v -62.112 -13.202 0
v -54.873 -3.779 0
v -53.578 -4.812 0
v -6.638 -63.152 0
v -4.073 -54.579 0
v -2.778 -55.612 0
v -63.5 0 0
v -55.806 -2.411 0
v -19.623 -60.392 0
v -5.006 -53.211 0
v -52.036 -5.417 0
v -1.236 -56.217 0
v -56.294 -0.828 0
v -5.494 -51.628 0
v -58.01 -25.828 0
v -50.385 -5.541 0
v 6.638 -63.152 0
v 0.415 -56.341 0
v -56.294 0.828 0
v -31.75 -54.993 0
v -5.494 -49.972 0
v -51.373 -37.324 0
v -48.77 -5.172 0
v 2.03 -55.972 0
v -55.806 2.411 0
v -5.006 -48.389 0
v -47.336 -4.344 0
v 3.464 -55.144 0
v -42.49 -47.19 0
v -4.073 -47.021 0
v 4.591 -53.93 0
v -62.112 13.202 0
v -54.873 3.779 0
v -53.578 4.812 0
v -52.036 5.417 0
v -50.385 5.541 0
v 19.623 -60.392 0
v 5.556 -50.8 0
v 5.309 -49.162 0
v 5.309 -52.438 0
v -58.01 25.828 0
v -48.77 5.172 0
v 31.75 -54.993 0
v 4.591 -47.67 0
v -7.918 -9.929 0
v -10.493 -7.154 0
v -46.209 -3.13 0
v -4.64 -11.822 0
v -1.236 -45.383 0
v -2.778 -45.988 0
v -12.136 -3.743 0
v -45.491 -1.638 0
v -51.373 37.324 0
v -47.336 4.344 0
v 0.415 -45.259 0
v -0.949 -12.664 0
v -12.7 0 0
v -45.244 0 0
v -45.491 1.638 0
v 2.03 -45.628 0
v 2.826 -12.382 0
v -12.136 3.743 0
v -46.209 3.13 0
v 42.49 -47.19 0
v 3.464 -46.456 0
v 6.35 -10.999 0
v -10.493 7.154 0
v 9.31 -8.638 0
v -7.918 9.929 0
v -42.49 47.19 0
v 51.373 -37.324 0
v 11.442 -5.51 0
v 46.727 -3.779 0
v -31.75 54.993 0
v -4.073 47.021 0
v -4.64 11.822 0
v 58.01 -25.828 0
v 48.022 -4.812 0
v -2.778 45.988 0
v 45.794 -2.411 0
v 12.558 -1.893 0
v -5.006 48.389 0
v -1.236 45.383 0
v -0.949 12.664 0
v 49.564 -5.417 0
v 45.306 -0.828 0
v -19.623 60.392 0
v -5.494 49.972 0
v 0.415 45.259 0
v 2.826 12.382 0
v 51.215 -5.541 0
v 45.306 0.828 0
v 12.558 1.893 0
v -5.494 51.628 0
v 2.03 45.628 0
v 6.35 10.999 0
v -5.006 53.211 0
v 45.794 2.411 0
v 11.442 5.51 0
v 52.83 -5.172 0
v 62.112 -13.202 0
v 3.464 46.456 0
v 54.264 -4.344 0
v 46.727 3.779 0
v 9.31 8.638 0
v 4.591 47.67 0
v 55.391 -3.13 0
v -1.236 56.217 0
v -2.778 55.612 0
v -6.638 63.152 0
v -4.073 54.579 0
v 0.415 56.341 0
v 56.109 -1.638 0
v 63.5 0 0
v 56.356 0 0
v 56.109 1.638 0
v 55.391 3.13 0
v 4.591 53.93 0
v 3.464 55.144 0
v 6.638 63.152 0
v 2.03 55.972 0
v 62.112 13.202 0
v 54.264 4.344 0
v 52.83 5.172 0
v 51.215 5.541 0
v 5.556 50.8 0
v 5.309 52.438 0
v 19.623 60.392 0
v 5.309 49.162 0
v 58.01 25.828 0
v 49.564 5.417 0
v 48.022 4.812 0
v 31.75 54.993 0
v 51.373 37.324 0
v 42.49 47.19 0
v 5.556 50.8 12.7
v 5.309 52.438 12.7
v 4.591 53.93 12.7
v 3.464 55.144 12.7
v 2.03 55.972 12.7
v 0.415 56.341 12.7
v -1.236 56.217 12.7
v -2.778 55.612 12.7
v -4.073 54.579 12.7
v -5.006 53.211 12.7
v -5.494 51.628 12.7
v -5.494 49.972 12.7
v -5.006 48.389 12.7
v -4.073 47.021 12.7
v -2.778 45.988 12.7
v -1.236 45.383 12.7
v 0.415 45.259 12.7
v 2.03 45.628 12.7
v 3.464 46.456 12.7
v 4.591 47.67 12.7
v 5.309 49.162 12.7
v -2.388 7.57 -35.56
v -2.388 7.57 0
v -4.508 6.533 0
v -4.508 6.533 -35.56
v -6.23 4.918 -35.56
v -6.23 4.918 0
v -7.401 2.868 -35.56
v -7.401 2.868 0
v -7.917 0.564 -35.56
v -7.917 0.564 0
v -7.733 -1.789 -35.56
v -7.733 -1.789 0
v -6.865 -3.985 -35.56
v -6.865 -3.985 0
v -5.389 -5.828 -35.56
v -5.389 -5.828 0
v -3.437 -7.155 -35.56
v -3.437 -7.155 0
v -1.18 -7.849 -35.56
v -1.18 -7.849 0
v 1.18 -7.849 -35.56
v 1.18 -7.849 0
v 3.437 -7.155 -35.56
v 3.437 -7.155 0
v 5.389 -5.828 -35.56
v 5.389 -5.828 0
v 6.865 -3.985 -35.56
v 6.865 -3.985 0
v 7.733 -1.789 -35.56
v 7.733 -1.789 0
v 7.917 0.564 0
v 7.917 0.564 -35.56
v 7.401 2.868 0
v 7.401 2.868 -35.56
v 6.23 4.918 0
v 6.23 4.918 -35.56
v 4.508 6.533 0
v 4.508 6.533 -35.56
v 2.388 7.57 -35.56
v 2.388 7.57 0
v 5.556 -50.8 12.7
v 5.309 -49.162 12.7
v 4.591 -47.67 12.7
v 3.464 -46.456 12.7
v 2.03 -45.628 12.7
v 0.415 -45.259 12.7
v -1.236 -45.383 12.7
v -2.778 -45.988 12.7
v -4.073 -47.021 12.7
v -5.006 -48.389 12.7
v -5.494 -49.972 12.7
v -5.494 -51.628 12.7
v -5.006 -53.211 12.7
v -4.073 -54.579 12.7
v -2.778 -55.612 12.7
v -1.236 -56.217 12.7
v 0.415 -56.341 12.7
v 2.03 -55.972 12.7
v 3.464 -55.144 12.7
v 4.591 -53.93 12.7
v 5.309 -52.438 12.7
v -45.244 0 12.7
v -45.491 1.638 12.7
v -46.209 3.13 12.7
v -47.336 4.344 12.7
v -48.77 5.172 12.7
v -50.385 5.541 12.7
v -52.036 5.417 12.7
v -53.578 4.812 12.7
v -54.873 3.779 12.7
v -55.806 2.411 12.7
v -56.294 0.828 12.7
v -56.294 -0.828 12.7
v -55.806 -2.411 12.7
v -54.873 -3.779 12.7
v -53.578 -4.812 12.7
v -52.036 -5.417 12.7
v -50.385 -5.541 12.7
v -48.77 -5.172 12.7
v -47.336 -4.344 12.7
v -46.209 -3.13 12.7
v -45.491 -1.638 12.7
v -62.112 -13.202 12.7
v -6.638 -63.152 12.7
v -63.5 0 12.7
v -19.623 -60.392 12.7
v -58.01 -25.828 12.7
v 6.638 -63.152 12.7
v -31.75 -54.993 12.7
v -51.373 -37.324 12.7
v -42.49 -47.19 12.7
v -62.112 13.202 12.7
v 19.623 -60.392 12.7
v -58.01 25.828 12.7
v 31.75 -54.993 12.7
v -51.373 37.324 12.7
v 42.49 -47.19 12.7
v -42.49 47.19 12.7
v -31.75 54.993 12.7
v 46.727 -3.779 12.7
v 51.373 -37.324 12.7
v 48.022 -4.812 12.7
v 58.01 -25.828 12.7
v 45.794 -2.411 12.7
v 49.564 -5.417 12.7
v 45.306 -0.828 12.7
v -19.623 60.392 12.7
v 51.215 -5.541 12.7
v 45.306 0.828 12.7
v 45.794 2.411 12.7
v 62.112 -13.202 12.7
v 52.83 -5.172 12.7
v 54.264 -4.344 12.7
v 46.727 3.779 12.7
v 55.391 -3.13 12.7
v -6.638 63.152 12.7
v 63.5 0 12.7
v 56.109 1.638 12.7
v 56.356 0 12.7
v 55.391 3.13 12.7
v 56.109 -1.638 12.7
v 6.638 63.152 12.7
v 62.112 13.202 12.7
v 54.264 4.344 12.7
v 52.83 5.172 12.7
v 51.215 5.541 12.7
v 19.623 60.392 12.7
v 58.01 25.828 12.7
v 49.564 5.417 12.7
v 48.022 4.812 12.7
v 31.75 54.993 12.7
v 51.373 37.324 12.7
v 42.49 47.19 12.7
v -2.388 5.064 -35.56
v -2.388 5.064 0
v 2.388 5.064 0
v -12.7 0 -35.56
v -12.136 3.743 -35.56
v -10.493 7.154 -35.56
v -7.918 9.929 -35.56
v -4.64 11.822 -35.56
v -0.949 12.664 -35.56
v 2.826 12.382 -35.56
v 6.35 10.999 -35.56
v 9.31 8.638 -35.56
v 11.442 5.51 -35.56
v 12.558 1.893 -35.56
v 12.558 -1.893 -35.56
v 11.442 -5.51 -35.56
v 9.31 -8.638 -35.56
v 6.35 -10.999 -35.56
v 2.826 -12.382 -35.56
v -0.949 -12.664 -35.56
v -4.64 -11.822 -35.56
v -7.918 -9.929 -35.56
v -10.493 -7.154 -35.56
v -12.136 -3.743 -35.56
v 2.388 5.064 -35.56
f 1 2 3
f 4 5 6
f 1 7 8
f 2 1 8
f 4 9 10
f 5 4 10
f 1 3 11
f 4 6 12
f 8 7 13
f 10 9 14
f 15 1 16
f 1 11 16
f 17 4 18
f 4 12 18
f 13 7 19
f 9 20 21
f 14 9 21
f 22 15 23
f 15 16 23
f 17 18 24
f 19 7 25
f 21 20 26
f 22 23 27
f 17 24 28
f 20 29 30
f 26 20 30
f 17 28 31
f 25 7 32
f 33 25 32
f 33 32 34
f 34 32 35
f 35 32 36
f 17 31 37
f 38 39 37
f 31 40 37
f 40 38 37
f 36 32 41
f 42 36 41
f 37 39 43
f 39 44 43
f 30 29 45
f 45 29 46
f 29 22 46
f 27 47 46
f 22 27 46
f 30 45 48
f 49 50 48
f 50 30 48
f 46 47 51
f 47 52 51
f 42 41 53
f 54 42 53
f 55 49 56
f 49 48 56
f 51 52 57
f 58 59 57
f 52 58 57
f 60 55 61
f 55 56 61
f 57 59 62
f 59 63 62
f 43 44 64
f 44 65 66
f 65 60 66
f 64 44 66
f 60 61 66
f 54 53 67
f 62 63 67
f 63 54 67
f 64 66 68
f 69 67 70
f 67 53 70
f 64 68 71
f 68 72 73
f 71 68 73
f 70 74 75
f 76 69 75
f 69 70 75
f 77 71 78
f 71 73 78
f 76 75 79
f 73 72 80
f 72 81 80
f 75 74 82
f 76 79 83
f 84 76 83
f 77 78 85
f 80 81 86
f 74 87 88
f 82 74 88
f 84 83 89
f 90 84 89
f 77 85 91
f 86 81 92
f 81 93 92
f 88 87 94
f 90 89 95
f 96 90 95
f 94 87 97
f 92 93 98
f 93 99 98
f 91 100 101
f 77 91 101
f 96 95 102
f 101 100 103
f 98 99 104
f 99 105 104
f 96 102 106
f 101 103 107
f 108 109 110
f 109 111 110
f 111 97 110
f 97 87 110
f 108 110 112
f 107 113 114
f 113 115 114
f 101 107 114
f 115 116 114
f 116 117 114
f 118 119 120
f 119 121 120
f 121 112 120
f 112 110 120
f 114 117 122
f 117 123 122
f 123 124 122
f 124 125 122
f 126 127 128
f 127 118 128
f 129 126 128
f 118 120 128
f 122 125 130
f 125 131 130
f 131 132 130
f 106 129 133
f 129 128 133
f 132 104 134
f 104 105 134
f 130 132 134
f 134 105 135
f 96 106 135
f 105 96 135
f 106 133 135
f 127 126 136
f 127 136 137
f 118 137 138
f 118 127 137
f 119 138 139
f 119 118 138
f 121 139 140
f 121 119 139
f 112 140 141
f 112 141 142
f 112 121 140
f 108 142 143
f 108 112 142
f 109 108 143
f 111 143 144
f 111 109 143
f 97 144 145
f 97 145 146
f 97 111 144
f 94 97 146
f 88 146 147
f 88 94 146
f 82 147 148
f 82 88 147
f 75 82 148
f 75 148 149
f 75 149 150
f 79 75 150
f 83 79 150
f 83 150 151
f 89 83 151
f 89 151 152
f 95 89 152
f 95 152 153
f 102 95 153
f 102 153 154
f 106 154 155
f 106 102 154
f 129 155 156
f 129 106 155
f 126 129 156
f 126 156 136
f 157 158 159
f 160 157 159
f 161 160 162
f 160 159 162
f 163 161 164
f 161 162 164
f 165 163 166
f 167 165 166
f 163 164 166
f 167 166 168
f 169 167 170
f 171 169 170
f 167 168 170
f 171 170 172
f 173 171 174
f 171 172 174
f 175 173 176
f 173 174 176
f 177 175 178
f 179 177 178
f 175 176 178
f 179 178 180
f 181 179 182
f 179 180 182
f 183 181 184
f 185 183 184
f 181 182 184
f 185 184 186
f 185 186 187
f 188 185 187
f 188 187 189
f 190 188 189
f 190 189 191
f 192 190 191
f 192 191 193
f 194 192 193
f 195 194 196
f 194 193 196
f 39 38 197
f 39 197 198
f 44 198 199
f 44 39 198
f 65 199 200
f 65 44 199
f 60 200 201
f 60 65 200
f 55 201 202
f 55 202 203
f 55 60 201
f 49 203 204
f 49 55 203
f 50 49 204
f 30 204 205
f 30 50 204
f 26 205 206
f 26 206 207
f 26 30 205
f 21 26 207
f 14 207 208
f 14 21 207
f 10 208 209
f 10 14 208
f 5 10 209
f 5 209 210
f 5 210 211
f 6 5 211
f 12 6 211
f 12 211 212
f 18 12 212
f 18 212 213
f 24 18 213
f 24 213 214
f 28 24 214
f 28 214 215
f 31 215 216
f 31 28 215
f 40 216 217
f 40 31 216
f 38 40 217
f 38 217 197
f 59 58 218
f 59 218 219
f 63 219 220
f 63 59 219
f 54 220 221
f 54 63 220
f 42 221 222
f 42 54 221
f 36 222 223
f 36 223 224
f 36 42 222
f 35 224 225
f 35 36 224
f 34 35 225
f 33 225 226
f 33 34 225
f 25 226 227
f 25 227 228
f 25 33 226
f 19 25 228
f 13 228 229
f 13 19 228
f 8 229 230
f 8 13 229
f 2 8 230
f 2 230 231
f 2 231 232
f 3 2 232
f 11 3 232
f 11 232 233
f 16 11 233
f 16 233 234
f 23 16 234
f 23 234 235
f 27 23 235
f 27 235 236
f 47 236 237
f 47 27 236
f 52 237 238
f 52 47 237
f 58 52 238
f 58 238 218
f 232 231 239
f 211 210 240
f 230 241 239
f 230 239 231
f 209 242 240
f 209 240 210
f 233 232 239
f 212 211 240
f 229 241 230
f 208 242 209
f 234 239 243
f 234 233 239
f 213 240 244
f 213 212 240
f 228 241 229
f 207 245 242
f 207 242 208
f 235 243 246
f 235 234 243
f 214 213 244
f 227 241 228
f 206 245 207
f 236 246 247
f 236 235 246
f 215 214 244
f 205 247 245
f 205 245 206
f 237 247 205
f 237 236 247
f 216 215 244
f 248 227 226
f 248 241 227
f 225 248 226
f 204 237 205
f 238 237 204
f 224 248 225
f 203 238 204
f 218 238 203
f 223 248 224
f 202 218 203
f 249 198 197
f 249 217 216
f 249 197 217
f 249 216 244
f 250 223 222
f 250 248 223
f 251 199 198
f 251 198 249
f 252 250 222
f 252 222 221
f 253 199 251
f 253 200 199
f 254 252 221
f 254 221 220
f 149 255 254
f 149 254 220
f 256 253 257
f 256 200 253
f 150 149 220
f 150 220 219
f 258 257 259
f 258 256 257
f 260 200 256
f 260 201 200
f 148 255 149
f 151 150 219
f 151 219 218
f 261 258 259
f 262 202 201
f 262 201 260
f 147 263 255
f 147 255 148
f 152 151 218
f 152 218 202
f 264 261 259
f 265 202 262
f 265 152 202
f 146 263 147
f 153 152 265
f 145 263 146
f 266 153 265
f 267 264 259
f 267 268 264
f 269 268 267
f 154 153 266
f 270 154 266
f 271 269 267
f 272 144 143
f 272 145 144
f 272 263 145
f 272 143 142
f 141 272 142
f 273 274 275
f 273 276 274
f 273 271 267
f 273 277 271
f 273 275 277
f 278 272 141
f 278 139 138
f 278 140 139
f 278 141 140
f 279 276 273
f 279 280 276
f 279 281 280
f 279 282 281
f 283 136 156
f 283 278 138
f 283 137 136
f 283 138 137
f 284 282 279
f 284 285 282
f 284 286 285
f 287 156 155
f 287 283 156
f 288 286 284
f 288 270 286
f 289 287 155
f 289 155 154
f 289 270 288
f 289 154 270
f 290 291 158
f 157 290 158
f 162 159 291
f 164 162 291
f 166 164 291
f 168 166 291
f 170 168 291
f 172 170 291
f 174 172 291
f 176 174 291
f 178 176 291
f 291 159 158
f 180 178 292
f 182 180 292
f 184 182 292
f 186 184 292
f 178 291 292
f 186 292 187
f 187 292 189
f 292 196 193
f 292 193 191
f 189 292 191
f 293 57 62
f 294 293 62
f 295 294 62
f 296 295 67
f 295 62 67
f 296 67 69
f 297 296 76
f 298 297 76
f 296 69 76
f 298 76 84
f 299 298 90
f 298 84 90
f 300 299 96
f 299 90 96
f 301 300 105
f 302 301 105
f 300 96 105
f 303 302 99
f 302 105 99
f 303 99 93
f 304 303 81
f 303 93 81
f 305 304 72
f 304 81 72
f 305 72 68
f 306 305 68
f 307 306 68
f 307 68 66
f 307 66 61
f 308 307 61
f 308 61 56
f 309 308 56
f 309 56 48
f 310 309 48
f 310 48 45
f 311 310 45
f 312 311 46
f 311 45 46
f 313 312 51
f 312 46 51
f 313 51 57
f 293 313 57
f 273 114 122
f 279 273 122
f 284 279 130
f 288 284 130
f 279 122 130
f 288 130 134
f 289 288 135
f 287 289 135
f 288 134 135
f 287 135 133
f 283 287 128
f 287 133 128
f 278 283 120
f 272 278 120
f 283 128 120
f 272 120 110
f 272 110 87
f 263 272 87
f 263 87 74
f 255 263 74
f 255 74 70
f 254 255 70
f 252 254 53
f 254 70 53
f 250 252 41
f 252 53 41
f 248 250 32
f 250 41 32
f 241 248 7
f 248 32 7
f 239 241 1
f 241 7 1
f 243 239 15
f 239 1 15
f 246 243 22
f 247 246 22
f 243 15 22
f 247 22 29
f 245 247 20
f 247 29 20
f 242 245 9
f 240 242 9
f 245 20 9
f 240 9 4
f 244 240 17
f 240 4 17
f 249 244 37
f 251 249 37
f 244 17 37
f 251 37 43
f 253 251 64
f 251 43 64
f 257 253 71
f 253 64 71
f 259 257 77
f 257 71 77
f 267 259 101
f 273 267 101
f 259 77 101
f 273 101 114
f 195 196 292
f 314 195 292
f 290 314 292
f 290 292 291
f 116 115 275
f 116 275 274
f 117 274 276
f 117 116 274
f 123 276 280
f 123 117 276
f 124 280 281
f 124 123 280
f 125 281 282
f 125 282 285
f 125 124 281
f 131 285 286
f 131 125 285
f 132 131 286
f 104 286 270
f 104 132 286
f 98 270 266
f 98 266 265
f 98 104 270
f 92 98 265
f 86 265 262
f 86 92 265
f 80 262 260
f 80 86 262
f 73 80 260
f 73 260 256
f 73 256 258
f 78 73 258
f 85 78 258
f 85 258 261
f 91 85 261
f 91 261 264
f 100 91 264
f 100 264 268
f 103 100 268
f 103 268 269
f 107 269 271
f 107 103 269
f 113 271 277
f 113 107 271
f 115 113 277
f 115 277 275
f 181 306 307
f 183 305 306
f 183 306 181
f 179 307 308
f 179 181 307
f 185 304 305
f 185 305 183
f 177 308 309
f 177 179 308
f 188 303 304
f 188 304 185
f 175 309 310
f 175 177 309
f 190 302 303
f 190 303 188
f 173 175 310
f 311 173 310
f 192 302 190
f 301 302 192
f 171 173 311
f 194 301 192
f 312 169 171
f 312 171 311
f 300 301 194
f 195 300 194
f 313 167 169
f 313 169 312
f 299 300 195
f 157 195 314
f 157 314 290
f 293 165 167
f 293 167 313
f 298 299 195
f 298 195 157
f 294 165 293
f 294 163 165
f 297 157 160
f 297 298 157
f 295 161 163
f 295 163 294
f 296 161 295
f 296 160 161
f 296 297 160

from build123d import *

# Parameters (mm, degrees)
SKETCH1_R           = 63.5
SKETCH1_R_2         = 5.55625
BOSS_EXTRUDE1_DEPTH = 12.7
SKETCH2_R           = 12.7
BOSS_EXTRUDE2_DEPTH = 35.56


with BuildPart() as part:
    # Sketch1 → Boss-Extrude1 (new body)
    with BuildSketch(Plane.XY):
        Circle(SKETCH1_R)
        with Locations((-50.8, 0)):
            Circle(SKETCH1_R_2, mode=Mode.SUBTRACT)
        with Locations((0, 50.8)):
            Circle(SKETCH1_R_2, mode=Mode.SUBTRACT)
        with Locations((50.8, 0)):
            Circle(SKETCH1_R_2, mode=Mode.SUBTRACT)
        with Locations((0, -50.8)):
            Circle(SKETCH1_R_2, mode=Mode.SUBTRACT)
    extrude(amount=BOSS_EXTRUDE1_DEPTH)

    # Sketch2 → Boss-Extrude2 (add)
    with BuildSketch(Plane(origin=(0, 0, 0), x_dir=(-1, 0, 0), z_dir=(0, 0, -1))):
        Circle(SKETCH2_R)
        with BuildLine():
            Line((-2.3876, 7.569892502), (-2.3876, 5.063801502))
            Line((-2.3876, 5.063801502), (2.3876, 5.063801502))
            Line((2.3876, 5.063801502), (2.3876, 7.569892502))
            ThreePointArc((2.3876, 7.569892502), (0, -7.9375), (-2.3876, 7.569892502))
        make_face(mode=Mode.SUBTRACT)
    extrude(amount=BOSS_EXTRUDE2_DEPTH)


solid = part.part
